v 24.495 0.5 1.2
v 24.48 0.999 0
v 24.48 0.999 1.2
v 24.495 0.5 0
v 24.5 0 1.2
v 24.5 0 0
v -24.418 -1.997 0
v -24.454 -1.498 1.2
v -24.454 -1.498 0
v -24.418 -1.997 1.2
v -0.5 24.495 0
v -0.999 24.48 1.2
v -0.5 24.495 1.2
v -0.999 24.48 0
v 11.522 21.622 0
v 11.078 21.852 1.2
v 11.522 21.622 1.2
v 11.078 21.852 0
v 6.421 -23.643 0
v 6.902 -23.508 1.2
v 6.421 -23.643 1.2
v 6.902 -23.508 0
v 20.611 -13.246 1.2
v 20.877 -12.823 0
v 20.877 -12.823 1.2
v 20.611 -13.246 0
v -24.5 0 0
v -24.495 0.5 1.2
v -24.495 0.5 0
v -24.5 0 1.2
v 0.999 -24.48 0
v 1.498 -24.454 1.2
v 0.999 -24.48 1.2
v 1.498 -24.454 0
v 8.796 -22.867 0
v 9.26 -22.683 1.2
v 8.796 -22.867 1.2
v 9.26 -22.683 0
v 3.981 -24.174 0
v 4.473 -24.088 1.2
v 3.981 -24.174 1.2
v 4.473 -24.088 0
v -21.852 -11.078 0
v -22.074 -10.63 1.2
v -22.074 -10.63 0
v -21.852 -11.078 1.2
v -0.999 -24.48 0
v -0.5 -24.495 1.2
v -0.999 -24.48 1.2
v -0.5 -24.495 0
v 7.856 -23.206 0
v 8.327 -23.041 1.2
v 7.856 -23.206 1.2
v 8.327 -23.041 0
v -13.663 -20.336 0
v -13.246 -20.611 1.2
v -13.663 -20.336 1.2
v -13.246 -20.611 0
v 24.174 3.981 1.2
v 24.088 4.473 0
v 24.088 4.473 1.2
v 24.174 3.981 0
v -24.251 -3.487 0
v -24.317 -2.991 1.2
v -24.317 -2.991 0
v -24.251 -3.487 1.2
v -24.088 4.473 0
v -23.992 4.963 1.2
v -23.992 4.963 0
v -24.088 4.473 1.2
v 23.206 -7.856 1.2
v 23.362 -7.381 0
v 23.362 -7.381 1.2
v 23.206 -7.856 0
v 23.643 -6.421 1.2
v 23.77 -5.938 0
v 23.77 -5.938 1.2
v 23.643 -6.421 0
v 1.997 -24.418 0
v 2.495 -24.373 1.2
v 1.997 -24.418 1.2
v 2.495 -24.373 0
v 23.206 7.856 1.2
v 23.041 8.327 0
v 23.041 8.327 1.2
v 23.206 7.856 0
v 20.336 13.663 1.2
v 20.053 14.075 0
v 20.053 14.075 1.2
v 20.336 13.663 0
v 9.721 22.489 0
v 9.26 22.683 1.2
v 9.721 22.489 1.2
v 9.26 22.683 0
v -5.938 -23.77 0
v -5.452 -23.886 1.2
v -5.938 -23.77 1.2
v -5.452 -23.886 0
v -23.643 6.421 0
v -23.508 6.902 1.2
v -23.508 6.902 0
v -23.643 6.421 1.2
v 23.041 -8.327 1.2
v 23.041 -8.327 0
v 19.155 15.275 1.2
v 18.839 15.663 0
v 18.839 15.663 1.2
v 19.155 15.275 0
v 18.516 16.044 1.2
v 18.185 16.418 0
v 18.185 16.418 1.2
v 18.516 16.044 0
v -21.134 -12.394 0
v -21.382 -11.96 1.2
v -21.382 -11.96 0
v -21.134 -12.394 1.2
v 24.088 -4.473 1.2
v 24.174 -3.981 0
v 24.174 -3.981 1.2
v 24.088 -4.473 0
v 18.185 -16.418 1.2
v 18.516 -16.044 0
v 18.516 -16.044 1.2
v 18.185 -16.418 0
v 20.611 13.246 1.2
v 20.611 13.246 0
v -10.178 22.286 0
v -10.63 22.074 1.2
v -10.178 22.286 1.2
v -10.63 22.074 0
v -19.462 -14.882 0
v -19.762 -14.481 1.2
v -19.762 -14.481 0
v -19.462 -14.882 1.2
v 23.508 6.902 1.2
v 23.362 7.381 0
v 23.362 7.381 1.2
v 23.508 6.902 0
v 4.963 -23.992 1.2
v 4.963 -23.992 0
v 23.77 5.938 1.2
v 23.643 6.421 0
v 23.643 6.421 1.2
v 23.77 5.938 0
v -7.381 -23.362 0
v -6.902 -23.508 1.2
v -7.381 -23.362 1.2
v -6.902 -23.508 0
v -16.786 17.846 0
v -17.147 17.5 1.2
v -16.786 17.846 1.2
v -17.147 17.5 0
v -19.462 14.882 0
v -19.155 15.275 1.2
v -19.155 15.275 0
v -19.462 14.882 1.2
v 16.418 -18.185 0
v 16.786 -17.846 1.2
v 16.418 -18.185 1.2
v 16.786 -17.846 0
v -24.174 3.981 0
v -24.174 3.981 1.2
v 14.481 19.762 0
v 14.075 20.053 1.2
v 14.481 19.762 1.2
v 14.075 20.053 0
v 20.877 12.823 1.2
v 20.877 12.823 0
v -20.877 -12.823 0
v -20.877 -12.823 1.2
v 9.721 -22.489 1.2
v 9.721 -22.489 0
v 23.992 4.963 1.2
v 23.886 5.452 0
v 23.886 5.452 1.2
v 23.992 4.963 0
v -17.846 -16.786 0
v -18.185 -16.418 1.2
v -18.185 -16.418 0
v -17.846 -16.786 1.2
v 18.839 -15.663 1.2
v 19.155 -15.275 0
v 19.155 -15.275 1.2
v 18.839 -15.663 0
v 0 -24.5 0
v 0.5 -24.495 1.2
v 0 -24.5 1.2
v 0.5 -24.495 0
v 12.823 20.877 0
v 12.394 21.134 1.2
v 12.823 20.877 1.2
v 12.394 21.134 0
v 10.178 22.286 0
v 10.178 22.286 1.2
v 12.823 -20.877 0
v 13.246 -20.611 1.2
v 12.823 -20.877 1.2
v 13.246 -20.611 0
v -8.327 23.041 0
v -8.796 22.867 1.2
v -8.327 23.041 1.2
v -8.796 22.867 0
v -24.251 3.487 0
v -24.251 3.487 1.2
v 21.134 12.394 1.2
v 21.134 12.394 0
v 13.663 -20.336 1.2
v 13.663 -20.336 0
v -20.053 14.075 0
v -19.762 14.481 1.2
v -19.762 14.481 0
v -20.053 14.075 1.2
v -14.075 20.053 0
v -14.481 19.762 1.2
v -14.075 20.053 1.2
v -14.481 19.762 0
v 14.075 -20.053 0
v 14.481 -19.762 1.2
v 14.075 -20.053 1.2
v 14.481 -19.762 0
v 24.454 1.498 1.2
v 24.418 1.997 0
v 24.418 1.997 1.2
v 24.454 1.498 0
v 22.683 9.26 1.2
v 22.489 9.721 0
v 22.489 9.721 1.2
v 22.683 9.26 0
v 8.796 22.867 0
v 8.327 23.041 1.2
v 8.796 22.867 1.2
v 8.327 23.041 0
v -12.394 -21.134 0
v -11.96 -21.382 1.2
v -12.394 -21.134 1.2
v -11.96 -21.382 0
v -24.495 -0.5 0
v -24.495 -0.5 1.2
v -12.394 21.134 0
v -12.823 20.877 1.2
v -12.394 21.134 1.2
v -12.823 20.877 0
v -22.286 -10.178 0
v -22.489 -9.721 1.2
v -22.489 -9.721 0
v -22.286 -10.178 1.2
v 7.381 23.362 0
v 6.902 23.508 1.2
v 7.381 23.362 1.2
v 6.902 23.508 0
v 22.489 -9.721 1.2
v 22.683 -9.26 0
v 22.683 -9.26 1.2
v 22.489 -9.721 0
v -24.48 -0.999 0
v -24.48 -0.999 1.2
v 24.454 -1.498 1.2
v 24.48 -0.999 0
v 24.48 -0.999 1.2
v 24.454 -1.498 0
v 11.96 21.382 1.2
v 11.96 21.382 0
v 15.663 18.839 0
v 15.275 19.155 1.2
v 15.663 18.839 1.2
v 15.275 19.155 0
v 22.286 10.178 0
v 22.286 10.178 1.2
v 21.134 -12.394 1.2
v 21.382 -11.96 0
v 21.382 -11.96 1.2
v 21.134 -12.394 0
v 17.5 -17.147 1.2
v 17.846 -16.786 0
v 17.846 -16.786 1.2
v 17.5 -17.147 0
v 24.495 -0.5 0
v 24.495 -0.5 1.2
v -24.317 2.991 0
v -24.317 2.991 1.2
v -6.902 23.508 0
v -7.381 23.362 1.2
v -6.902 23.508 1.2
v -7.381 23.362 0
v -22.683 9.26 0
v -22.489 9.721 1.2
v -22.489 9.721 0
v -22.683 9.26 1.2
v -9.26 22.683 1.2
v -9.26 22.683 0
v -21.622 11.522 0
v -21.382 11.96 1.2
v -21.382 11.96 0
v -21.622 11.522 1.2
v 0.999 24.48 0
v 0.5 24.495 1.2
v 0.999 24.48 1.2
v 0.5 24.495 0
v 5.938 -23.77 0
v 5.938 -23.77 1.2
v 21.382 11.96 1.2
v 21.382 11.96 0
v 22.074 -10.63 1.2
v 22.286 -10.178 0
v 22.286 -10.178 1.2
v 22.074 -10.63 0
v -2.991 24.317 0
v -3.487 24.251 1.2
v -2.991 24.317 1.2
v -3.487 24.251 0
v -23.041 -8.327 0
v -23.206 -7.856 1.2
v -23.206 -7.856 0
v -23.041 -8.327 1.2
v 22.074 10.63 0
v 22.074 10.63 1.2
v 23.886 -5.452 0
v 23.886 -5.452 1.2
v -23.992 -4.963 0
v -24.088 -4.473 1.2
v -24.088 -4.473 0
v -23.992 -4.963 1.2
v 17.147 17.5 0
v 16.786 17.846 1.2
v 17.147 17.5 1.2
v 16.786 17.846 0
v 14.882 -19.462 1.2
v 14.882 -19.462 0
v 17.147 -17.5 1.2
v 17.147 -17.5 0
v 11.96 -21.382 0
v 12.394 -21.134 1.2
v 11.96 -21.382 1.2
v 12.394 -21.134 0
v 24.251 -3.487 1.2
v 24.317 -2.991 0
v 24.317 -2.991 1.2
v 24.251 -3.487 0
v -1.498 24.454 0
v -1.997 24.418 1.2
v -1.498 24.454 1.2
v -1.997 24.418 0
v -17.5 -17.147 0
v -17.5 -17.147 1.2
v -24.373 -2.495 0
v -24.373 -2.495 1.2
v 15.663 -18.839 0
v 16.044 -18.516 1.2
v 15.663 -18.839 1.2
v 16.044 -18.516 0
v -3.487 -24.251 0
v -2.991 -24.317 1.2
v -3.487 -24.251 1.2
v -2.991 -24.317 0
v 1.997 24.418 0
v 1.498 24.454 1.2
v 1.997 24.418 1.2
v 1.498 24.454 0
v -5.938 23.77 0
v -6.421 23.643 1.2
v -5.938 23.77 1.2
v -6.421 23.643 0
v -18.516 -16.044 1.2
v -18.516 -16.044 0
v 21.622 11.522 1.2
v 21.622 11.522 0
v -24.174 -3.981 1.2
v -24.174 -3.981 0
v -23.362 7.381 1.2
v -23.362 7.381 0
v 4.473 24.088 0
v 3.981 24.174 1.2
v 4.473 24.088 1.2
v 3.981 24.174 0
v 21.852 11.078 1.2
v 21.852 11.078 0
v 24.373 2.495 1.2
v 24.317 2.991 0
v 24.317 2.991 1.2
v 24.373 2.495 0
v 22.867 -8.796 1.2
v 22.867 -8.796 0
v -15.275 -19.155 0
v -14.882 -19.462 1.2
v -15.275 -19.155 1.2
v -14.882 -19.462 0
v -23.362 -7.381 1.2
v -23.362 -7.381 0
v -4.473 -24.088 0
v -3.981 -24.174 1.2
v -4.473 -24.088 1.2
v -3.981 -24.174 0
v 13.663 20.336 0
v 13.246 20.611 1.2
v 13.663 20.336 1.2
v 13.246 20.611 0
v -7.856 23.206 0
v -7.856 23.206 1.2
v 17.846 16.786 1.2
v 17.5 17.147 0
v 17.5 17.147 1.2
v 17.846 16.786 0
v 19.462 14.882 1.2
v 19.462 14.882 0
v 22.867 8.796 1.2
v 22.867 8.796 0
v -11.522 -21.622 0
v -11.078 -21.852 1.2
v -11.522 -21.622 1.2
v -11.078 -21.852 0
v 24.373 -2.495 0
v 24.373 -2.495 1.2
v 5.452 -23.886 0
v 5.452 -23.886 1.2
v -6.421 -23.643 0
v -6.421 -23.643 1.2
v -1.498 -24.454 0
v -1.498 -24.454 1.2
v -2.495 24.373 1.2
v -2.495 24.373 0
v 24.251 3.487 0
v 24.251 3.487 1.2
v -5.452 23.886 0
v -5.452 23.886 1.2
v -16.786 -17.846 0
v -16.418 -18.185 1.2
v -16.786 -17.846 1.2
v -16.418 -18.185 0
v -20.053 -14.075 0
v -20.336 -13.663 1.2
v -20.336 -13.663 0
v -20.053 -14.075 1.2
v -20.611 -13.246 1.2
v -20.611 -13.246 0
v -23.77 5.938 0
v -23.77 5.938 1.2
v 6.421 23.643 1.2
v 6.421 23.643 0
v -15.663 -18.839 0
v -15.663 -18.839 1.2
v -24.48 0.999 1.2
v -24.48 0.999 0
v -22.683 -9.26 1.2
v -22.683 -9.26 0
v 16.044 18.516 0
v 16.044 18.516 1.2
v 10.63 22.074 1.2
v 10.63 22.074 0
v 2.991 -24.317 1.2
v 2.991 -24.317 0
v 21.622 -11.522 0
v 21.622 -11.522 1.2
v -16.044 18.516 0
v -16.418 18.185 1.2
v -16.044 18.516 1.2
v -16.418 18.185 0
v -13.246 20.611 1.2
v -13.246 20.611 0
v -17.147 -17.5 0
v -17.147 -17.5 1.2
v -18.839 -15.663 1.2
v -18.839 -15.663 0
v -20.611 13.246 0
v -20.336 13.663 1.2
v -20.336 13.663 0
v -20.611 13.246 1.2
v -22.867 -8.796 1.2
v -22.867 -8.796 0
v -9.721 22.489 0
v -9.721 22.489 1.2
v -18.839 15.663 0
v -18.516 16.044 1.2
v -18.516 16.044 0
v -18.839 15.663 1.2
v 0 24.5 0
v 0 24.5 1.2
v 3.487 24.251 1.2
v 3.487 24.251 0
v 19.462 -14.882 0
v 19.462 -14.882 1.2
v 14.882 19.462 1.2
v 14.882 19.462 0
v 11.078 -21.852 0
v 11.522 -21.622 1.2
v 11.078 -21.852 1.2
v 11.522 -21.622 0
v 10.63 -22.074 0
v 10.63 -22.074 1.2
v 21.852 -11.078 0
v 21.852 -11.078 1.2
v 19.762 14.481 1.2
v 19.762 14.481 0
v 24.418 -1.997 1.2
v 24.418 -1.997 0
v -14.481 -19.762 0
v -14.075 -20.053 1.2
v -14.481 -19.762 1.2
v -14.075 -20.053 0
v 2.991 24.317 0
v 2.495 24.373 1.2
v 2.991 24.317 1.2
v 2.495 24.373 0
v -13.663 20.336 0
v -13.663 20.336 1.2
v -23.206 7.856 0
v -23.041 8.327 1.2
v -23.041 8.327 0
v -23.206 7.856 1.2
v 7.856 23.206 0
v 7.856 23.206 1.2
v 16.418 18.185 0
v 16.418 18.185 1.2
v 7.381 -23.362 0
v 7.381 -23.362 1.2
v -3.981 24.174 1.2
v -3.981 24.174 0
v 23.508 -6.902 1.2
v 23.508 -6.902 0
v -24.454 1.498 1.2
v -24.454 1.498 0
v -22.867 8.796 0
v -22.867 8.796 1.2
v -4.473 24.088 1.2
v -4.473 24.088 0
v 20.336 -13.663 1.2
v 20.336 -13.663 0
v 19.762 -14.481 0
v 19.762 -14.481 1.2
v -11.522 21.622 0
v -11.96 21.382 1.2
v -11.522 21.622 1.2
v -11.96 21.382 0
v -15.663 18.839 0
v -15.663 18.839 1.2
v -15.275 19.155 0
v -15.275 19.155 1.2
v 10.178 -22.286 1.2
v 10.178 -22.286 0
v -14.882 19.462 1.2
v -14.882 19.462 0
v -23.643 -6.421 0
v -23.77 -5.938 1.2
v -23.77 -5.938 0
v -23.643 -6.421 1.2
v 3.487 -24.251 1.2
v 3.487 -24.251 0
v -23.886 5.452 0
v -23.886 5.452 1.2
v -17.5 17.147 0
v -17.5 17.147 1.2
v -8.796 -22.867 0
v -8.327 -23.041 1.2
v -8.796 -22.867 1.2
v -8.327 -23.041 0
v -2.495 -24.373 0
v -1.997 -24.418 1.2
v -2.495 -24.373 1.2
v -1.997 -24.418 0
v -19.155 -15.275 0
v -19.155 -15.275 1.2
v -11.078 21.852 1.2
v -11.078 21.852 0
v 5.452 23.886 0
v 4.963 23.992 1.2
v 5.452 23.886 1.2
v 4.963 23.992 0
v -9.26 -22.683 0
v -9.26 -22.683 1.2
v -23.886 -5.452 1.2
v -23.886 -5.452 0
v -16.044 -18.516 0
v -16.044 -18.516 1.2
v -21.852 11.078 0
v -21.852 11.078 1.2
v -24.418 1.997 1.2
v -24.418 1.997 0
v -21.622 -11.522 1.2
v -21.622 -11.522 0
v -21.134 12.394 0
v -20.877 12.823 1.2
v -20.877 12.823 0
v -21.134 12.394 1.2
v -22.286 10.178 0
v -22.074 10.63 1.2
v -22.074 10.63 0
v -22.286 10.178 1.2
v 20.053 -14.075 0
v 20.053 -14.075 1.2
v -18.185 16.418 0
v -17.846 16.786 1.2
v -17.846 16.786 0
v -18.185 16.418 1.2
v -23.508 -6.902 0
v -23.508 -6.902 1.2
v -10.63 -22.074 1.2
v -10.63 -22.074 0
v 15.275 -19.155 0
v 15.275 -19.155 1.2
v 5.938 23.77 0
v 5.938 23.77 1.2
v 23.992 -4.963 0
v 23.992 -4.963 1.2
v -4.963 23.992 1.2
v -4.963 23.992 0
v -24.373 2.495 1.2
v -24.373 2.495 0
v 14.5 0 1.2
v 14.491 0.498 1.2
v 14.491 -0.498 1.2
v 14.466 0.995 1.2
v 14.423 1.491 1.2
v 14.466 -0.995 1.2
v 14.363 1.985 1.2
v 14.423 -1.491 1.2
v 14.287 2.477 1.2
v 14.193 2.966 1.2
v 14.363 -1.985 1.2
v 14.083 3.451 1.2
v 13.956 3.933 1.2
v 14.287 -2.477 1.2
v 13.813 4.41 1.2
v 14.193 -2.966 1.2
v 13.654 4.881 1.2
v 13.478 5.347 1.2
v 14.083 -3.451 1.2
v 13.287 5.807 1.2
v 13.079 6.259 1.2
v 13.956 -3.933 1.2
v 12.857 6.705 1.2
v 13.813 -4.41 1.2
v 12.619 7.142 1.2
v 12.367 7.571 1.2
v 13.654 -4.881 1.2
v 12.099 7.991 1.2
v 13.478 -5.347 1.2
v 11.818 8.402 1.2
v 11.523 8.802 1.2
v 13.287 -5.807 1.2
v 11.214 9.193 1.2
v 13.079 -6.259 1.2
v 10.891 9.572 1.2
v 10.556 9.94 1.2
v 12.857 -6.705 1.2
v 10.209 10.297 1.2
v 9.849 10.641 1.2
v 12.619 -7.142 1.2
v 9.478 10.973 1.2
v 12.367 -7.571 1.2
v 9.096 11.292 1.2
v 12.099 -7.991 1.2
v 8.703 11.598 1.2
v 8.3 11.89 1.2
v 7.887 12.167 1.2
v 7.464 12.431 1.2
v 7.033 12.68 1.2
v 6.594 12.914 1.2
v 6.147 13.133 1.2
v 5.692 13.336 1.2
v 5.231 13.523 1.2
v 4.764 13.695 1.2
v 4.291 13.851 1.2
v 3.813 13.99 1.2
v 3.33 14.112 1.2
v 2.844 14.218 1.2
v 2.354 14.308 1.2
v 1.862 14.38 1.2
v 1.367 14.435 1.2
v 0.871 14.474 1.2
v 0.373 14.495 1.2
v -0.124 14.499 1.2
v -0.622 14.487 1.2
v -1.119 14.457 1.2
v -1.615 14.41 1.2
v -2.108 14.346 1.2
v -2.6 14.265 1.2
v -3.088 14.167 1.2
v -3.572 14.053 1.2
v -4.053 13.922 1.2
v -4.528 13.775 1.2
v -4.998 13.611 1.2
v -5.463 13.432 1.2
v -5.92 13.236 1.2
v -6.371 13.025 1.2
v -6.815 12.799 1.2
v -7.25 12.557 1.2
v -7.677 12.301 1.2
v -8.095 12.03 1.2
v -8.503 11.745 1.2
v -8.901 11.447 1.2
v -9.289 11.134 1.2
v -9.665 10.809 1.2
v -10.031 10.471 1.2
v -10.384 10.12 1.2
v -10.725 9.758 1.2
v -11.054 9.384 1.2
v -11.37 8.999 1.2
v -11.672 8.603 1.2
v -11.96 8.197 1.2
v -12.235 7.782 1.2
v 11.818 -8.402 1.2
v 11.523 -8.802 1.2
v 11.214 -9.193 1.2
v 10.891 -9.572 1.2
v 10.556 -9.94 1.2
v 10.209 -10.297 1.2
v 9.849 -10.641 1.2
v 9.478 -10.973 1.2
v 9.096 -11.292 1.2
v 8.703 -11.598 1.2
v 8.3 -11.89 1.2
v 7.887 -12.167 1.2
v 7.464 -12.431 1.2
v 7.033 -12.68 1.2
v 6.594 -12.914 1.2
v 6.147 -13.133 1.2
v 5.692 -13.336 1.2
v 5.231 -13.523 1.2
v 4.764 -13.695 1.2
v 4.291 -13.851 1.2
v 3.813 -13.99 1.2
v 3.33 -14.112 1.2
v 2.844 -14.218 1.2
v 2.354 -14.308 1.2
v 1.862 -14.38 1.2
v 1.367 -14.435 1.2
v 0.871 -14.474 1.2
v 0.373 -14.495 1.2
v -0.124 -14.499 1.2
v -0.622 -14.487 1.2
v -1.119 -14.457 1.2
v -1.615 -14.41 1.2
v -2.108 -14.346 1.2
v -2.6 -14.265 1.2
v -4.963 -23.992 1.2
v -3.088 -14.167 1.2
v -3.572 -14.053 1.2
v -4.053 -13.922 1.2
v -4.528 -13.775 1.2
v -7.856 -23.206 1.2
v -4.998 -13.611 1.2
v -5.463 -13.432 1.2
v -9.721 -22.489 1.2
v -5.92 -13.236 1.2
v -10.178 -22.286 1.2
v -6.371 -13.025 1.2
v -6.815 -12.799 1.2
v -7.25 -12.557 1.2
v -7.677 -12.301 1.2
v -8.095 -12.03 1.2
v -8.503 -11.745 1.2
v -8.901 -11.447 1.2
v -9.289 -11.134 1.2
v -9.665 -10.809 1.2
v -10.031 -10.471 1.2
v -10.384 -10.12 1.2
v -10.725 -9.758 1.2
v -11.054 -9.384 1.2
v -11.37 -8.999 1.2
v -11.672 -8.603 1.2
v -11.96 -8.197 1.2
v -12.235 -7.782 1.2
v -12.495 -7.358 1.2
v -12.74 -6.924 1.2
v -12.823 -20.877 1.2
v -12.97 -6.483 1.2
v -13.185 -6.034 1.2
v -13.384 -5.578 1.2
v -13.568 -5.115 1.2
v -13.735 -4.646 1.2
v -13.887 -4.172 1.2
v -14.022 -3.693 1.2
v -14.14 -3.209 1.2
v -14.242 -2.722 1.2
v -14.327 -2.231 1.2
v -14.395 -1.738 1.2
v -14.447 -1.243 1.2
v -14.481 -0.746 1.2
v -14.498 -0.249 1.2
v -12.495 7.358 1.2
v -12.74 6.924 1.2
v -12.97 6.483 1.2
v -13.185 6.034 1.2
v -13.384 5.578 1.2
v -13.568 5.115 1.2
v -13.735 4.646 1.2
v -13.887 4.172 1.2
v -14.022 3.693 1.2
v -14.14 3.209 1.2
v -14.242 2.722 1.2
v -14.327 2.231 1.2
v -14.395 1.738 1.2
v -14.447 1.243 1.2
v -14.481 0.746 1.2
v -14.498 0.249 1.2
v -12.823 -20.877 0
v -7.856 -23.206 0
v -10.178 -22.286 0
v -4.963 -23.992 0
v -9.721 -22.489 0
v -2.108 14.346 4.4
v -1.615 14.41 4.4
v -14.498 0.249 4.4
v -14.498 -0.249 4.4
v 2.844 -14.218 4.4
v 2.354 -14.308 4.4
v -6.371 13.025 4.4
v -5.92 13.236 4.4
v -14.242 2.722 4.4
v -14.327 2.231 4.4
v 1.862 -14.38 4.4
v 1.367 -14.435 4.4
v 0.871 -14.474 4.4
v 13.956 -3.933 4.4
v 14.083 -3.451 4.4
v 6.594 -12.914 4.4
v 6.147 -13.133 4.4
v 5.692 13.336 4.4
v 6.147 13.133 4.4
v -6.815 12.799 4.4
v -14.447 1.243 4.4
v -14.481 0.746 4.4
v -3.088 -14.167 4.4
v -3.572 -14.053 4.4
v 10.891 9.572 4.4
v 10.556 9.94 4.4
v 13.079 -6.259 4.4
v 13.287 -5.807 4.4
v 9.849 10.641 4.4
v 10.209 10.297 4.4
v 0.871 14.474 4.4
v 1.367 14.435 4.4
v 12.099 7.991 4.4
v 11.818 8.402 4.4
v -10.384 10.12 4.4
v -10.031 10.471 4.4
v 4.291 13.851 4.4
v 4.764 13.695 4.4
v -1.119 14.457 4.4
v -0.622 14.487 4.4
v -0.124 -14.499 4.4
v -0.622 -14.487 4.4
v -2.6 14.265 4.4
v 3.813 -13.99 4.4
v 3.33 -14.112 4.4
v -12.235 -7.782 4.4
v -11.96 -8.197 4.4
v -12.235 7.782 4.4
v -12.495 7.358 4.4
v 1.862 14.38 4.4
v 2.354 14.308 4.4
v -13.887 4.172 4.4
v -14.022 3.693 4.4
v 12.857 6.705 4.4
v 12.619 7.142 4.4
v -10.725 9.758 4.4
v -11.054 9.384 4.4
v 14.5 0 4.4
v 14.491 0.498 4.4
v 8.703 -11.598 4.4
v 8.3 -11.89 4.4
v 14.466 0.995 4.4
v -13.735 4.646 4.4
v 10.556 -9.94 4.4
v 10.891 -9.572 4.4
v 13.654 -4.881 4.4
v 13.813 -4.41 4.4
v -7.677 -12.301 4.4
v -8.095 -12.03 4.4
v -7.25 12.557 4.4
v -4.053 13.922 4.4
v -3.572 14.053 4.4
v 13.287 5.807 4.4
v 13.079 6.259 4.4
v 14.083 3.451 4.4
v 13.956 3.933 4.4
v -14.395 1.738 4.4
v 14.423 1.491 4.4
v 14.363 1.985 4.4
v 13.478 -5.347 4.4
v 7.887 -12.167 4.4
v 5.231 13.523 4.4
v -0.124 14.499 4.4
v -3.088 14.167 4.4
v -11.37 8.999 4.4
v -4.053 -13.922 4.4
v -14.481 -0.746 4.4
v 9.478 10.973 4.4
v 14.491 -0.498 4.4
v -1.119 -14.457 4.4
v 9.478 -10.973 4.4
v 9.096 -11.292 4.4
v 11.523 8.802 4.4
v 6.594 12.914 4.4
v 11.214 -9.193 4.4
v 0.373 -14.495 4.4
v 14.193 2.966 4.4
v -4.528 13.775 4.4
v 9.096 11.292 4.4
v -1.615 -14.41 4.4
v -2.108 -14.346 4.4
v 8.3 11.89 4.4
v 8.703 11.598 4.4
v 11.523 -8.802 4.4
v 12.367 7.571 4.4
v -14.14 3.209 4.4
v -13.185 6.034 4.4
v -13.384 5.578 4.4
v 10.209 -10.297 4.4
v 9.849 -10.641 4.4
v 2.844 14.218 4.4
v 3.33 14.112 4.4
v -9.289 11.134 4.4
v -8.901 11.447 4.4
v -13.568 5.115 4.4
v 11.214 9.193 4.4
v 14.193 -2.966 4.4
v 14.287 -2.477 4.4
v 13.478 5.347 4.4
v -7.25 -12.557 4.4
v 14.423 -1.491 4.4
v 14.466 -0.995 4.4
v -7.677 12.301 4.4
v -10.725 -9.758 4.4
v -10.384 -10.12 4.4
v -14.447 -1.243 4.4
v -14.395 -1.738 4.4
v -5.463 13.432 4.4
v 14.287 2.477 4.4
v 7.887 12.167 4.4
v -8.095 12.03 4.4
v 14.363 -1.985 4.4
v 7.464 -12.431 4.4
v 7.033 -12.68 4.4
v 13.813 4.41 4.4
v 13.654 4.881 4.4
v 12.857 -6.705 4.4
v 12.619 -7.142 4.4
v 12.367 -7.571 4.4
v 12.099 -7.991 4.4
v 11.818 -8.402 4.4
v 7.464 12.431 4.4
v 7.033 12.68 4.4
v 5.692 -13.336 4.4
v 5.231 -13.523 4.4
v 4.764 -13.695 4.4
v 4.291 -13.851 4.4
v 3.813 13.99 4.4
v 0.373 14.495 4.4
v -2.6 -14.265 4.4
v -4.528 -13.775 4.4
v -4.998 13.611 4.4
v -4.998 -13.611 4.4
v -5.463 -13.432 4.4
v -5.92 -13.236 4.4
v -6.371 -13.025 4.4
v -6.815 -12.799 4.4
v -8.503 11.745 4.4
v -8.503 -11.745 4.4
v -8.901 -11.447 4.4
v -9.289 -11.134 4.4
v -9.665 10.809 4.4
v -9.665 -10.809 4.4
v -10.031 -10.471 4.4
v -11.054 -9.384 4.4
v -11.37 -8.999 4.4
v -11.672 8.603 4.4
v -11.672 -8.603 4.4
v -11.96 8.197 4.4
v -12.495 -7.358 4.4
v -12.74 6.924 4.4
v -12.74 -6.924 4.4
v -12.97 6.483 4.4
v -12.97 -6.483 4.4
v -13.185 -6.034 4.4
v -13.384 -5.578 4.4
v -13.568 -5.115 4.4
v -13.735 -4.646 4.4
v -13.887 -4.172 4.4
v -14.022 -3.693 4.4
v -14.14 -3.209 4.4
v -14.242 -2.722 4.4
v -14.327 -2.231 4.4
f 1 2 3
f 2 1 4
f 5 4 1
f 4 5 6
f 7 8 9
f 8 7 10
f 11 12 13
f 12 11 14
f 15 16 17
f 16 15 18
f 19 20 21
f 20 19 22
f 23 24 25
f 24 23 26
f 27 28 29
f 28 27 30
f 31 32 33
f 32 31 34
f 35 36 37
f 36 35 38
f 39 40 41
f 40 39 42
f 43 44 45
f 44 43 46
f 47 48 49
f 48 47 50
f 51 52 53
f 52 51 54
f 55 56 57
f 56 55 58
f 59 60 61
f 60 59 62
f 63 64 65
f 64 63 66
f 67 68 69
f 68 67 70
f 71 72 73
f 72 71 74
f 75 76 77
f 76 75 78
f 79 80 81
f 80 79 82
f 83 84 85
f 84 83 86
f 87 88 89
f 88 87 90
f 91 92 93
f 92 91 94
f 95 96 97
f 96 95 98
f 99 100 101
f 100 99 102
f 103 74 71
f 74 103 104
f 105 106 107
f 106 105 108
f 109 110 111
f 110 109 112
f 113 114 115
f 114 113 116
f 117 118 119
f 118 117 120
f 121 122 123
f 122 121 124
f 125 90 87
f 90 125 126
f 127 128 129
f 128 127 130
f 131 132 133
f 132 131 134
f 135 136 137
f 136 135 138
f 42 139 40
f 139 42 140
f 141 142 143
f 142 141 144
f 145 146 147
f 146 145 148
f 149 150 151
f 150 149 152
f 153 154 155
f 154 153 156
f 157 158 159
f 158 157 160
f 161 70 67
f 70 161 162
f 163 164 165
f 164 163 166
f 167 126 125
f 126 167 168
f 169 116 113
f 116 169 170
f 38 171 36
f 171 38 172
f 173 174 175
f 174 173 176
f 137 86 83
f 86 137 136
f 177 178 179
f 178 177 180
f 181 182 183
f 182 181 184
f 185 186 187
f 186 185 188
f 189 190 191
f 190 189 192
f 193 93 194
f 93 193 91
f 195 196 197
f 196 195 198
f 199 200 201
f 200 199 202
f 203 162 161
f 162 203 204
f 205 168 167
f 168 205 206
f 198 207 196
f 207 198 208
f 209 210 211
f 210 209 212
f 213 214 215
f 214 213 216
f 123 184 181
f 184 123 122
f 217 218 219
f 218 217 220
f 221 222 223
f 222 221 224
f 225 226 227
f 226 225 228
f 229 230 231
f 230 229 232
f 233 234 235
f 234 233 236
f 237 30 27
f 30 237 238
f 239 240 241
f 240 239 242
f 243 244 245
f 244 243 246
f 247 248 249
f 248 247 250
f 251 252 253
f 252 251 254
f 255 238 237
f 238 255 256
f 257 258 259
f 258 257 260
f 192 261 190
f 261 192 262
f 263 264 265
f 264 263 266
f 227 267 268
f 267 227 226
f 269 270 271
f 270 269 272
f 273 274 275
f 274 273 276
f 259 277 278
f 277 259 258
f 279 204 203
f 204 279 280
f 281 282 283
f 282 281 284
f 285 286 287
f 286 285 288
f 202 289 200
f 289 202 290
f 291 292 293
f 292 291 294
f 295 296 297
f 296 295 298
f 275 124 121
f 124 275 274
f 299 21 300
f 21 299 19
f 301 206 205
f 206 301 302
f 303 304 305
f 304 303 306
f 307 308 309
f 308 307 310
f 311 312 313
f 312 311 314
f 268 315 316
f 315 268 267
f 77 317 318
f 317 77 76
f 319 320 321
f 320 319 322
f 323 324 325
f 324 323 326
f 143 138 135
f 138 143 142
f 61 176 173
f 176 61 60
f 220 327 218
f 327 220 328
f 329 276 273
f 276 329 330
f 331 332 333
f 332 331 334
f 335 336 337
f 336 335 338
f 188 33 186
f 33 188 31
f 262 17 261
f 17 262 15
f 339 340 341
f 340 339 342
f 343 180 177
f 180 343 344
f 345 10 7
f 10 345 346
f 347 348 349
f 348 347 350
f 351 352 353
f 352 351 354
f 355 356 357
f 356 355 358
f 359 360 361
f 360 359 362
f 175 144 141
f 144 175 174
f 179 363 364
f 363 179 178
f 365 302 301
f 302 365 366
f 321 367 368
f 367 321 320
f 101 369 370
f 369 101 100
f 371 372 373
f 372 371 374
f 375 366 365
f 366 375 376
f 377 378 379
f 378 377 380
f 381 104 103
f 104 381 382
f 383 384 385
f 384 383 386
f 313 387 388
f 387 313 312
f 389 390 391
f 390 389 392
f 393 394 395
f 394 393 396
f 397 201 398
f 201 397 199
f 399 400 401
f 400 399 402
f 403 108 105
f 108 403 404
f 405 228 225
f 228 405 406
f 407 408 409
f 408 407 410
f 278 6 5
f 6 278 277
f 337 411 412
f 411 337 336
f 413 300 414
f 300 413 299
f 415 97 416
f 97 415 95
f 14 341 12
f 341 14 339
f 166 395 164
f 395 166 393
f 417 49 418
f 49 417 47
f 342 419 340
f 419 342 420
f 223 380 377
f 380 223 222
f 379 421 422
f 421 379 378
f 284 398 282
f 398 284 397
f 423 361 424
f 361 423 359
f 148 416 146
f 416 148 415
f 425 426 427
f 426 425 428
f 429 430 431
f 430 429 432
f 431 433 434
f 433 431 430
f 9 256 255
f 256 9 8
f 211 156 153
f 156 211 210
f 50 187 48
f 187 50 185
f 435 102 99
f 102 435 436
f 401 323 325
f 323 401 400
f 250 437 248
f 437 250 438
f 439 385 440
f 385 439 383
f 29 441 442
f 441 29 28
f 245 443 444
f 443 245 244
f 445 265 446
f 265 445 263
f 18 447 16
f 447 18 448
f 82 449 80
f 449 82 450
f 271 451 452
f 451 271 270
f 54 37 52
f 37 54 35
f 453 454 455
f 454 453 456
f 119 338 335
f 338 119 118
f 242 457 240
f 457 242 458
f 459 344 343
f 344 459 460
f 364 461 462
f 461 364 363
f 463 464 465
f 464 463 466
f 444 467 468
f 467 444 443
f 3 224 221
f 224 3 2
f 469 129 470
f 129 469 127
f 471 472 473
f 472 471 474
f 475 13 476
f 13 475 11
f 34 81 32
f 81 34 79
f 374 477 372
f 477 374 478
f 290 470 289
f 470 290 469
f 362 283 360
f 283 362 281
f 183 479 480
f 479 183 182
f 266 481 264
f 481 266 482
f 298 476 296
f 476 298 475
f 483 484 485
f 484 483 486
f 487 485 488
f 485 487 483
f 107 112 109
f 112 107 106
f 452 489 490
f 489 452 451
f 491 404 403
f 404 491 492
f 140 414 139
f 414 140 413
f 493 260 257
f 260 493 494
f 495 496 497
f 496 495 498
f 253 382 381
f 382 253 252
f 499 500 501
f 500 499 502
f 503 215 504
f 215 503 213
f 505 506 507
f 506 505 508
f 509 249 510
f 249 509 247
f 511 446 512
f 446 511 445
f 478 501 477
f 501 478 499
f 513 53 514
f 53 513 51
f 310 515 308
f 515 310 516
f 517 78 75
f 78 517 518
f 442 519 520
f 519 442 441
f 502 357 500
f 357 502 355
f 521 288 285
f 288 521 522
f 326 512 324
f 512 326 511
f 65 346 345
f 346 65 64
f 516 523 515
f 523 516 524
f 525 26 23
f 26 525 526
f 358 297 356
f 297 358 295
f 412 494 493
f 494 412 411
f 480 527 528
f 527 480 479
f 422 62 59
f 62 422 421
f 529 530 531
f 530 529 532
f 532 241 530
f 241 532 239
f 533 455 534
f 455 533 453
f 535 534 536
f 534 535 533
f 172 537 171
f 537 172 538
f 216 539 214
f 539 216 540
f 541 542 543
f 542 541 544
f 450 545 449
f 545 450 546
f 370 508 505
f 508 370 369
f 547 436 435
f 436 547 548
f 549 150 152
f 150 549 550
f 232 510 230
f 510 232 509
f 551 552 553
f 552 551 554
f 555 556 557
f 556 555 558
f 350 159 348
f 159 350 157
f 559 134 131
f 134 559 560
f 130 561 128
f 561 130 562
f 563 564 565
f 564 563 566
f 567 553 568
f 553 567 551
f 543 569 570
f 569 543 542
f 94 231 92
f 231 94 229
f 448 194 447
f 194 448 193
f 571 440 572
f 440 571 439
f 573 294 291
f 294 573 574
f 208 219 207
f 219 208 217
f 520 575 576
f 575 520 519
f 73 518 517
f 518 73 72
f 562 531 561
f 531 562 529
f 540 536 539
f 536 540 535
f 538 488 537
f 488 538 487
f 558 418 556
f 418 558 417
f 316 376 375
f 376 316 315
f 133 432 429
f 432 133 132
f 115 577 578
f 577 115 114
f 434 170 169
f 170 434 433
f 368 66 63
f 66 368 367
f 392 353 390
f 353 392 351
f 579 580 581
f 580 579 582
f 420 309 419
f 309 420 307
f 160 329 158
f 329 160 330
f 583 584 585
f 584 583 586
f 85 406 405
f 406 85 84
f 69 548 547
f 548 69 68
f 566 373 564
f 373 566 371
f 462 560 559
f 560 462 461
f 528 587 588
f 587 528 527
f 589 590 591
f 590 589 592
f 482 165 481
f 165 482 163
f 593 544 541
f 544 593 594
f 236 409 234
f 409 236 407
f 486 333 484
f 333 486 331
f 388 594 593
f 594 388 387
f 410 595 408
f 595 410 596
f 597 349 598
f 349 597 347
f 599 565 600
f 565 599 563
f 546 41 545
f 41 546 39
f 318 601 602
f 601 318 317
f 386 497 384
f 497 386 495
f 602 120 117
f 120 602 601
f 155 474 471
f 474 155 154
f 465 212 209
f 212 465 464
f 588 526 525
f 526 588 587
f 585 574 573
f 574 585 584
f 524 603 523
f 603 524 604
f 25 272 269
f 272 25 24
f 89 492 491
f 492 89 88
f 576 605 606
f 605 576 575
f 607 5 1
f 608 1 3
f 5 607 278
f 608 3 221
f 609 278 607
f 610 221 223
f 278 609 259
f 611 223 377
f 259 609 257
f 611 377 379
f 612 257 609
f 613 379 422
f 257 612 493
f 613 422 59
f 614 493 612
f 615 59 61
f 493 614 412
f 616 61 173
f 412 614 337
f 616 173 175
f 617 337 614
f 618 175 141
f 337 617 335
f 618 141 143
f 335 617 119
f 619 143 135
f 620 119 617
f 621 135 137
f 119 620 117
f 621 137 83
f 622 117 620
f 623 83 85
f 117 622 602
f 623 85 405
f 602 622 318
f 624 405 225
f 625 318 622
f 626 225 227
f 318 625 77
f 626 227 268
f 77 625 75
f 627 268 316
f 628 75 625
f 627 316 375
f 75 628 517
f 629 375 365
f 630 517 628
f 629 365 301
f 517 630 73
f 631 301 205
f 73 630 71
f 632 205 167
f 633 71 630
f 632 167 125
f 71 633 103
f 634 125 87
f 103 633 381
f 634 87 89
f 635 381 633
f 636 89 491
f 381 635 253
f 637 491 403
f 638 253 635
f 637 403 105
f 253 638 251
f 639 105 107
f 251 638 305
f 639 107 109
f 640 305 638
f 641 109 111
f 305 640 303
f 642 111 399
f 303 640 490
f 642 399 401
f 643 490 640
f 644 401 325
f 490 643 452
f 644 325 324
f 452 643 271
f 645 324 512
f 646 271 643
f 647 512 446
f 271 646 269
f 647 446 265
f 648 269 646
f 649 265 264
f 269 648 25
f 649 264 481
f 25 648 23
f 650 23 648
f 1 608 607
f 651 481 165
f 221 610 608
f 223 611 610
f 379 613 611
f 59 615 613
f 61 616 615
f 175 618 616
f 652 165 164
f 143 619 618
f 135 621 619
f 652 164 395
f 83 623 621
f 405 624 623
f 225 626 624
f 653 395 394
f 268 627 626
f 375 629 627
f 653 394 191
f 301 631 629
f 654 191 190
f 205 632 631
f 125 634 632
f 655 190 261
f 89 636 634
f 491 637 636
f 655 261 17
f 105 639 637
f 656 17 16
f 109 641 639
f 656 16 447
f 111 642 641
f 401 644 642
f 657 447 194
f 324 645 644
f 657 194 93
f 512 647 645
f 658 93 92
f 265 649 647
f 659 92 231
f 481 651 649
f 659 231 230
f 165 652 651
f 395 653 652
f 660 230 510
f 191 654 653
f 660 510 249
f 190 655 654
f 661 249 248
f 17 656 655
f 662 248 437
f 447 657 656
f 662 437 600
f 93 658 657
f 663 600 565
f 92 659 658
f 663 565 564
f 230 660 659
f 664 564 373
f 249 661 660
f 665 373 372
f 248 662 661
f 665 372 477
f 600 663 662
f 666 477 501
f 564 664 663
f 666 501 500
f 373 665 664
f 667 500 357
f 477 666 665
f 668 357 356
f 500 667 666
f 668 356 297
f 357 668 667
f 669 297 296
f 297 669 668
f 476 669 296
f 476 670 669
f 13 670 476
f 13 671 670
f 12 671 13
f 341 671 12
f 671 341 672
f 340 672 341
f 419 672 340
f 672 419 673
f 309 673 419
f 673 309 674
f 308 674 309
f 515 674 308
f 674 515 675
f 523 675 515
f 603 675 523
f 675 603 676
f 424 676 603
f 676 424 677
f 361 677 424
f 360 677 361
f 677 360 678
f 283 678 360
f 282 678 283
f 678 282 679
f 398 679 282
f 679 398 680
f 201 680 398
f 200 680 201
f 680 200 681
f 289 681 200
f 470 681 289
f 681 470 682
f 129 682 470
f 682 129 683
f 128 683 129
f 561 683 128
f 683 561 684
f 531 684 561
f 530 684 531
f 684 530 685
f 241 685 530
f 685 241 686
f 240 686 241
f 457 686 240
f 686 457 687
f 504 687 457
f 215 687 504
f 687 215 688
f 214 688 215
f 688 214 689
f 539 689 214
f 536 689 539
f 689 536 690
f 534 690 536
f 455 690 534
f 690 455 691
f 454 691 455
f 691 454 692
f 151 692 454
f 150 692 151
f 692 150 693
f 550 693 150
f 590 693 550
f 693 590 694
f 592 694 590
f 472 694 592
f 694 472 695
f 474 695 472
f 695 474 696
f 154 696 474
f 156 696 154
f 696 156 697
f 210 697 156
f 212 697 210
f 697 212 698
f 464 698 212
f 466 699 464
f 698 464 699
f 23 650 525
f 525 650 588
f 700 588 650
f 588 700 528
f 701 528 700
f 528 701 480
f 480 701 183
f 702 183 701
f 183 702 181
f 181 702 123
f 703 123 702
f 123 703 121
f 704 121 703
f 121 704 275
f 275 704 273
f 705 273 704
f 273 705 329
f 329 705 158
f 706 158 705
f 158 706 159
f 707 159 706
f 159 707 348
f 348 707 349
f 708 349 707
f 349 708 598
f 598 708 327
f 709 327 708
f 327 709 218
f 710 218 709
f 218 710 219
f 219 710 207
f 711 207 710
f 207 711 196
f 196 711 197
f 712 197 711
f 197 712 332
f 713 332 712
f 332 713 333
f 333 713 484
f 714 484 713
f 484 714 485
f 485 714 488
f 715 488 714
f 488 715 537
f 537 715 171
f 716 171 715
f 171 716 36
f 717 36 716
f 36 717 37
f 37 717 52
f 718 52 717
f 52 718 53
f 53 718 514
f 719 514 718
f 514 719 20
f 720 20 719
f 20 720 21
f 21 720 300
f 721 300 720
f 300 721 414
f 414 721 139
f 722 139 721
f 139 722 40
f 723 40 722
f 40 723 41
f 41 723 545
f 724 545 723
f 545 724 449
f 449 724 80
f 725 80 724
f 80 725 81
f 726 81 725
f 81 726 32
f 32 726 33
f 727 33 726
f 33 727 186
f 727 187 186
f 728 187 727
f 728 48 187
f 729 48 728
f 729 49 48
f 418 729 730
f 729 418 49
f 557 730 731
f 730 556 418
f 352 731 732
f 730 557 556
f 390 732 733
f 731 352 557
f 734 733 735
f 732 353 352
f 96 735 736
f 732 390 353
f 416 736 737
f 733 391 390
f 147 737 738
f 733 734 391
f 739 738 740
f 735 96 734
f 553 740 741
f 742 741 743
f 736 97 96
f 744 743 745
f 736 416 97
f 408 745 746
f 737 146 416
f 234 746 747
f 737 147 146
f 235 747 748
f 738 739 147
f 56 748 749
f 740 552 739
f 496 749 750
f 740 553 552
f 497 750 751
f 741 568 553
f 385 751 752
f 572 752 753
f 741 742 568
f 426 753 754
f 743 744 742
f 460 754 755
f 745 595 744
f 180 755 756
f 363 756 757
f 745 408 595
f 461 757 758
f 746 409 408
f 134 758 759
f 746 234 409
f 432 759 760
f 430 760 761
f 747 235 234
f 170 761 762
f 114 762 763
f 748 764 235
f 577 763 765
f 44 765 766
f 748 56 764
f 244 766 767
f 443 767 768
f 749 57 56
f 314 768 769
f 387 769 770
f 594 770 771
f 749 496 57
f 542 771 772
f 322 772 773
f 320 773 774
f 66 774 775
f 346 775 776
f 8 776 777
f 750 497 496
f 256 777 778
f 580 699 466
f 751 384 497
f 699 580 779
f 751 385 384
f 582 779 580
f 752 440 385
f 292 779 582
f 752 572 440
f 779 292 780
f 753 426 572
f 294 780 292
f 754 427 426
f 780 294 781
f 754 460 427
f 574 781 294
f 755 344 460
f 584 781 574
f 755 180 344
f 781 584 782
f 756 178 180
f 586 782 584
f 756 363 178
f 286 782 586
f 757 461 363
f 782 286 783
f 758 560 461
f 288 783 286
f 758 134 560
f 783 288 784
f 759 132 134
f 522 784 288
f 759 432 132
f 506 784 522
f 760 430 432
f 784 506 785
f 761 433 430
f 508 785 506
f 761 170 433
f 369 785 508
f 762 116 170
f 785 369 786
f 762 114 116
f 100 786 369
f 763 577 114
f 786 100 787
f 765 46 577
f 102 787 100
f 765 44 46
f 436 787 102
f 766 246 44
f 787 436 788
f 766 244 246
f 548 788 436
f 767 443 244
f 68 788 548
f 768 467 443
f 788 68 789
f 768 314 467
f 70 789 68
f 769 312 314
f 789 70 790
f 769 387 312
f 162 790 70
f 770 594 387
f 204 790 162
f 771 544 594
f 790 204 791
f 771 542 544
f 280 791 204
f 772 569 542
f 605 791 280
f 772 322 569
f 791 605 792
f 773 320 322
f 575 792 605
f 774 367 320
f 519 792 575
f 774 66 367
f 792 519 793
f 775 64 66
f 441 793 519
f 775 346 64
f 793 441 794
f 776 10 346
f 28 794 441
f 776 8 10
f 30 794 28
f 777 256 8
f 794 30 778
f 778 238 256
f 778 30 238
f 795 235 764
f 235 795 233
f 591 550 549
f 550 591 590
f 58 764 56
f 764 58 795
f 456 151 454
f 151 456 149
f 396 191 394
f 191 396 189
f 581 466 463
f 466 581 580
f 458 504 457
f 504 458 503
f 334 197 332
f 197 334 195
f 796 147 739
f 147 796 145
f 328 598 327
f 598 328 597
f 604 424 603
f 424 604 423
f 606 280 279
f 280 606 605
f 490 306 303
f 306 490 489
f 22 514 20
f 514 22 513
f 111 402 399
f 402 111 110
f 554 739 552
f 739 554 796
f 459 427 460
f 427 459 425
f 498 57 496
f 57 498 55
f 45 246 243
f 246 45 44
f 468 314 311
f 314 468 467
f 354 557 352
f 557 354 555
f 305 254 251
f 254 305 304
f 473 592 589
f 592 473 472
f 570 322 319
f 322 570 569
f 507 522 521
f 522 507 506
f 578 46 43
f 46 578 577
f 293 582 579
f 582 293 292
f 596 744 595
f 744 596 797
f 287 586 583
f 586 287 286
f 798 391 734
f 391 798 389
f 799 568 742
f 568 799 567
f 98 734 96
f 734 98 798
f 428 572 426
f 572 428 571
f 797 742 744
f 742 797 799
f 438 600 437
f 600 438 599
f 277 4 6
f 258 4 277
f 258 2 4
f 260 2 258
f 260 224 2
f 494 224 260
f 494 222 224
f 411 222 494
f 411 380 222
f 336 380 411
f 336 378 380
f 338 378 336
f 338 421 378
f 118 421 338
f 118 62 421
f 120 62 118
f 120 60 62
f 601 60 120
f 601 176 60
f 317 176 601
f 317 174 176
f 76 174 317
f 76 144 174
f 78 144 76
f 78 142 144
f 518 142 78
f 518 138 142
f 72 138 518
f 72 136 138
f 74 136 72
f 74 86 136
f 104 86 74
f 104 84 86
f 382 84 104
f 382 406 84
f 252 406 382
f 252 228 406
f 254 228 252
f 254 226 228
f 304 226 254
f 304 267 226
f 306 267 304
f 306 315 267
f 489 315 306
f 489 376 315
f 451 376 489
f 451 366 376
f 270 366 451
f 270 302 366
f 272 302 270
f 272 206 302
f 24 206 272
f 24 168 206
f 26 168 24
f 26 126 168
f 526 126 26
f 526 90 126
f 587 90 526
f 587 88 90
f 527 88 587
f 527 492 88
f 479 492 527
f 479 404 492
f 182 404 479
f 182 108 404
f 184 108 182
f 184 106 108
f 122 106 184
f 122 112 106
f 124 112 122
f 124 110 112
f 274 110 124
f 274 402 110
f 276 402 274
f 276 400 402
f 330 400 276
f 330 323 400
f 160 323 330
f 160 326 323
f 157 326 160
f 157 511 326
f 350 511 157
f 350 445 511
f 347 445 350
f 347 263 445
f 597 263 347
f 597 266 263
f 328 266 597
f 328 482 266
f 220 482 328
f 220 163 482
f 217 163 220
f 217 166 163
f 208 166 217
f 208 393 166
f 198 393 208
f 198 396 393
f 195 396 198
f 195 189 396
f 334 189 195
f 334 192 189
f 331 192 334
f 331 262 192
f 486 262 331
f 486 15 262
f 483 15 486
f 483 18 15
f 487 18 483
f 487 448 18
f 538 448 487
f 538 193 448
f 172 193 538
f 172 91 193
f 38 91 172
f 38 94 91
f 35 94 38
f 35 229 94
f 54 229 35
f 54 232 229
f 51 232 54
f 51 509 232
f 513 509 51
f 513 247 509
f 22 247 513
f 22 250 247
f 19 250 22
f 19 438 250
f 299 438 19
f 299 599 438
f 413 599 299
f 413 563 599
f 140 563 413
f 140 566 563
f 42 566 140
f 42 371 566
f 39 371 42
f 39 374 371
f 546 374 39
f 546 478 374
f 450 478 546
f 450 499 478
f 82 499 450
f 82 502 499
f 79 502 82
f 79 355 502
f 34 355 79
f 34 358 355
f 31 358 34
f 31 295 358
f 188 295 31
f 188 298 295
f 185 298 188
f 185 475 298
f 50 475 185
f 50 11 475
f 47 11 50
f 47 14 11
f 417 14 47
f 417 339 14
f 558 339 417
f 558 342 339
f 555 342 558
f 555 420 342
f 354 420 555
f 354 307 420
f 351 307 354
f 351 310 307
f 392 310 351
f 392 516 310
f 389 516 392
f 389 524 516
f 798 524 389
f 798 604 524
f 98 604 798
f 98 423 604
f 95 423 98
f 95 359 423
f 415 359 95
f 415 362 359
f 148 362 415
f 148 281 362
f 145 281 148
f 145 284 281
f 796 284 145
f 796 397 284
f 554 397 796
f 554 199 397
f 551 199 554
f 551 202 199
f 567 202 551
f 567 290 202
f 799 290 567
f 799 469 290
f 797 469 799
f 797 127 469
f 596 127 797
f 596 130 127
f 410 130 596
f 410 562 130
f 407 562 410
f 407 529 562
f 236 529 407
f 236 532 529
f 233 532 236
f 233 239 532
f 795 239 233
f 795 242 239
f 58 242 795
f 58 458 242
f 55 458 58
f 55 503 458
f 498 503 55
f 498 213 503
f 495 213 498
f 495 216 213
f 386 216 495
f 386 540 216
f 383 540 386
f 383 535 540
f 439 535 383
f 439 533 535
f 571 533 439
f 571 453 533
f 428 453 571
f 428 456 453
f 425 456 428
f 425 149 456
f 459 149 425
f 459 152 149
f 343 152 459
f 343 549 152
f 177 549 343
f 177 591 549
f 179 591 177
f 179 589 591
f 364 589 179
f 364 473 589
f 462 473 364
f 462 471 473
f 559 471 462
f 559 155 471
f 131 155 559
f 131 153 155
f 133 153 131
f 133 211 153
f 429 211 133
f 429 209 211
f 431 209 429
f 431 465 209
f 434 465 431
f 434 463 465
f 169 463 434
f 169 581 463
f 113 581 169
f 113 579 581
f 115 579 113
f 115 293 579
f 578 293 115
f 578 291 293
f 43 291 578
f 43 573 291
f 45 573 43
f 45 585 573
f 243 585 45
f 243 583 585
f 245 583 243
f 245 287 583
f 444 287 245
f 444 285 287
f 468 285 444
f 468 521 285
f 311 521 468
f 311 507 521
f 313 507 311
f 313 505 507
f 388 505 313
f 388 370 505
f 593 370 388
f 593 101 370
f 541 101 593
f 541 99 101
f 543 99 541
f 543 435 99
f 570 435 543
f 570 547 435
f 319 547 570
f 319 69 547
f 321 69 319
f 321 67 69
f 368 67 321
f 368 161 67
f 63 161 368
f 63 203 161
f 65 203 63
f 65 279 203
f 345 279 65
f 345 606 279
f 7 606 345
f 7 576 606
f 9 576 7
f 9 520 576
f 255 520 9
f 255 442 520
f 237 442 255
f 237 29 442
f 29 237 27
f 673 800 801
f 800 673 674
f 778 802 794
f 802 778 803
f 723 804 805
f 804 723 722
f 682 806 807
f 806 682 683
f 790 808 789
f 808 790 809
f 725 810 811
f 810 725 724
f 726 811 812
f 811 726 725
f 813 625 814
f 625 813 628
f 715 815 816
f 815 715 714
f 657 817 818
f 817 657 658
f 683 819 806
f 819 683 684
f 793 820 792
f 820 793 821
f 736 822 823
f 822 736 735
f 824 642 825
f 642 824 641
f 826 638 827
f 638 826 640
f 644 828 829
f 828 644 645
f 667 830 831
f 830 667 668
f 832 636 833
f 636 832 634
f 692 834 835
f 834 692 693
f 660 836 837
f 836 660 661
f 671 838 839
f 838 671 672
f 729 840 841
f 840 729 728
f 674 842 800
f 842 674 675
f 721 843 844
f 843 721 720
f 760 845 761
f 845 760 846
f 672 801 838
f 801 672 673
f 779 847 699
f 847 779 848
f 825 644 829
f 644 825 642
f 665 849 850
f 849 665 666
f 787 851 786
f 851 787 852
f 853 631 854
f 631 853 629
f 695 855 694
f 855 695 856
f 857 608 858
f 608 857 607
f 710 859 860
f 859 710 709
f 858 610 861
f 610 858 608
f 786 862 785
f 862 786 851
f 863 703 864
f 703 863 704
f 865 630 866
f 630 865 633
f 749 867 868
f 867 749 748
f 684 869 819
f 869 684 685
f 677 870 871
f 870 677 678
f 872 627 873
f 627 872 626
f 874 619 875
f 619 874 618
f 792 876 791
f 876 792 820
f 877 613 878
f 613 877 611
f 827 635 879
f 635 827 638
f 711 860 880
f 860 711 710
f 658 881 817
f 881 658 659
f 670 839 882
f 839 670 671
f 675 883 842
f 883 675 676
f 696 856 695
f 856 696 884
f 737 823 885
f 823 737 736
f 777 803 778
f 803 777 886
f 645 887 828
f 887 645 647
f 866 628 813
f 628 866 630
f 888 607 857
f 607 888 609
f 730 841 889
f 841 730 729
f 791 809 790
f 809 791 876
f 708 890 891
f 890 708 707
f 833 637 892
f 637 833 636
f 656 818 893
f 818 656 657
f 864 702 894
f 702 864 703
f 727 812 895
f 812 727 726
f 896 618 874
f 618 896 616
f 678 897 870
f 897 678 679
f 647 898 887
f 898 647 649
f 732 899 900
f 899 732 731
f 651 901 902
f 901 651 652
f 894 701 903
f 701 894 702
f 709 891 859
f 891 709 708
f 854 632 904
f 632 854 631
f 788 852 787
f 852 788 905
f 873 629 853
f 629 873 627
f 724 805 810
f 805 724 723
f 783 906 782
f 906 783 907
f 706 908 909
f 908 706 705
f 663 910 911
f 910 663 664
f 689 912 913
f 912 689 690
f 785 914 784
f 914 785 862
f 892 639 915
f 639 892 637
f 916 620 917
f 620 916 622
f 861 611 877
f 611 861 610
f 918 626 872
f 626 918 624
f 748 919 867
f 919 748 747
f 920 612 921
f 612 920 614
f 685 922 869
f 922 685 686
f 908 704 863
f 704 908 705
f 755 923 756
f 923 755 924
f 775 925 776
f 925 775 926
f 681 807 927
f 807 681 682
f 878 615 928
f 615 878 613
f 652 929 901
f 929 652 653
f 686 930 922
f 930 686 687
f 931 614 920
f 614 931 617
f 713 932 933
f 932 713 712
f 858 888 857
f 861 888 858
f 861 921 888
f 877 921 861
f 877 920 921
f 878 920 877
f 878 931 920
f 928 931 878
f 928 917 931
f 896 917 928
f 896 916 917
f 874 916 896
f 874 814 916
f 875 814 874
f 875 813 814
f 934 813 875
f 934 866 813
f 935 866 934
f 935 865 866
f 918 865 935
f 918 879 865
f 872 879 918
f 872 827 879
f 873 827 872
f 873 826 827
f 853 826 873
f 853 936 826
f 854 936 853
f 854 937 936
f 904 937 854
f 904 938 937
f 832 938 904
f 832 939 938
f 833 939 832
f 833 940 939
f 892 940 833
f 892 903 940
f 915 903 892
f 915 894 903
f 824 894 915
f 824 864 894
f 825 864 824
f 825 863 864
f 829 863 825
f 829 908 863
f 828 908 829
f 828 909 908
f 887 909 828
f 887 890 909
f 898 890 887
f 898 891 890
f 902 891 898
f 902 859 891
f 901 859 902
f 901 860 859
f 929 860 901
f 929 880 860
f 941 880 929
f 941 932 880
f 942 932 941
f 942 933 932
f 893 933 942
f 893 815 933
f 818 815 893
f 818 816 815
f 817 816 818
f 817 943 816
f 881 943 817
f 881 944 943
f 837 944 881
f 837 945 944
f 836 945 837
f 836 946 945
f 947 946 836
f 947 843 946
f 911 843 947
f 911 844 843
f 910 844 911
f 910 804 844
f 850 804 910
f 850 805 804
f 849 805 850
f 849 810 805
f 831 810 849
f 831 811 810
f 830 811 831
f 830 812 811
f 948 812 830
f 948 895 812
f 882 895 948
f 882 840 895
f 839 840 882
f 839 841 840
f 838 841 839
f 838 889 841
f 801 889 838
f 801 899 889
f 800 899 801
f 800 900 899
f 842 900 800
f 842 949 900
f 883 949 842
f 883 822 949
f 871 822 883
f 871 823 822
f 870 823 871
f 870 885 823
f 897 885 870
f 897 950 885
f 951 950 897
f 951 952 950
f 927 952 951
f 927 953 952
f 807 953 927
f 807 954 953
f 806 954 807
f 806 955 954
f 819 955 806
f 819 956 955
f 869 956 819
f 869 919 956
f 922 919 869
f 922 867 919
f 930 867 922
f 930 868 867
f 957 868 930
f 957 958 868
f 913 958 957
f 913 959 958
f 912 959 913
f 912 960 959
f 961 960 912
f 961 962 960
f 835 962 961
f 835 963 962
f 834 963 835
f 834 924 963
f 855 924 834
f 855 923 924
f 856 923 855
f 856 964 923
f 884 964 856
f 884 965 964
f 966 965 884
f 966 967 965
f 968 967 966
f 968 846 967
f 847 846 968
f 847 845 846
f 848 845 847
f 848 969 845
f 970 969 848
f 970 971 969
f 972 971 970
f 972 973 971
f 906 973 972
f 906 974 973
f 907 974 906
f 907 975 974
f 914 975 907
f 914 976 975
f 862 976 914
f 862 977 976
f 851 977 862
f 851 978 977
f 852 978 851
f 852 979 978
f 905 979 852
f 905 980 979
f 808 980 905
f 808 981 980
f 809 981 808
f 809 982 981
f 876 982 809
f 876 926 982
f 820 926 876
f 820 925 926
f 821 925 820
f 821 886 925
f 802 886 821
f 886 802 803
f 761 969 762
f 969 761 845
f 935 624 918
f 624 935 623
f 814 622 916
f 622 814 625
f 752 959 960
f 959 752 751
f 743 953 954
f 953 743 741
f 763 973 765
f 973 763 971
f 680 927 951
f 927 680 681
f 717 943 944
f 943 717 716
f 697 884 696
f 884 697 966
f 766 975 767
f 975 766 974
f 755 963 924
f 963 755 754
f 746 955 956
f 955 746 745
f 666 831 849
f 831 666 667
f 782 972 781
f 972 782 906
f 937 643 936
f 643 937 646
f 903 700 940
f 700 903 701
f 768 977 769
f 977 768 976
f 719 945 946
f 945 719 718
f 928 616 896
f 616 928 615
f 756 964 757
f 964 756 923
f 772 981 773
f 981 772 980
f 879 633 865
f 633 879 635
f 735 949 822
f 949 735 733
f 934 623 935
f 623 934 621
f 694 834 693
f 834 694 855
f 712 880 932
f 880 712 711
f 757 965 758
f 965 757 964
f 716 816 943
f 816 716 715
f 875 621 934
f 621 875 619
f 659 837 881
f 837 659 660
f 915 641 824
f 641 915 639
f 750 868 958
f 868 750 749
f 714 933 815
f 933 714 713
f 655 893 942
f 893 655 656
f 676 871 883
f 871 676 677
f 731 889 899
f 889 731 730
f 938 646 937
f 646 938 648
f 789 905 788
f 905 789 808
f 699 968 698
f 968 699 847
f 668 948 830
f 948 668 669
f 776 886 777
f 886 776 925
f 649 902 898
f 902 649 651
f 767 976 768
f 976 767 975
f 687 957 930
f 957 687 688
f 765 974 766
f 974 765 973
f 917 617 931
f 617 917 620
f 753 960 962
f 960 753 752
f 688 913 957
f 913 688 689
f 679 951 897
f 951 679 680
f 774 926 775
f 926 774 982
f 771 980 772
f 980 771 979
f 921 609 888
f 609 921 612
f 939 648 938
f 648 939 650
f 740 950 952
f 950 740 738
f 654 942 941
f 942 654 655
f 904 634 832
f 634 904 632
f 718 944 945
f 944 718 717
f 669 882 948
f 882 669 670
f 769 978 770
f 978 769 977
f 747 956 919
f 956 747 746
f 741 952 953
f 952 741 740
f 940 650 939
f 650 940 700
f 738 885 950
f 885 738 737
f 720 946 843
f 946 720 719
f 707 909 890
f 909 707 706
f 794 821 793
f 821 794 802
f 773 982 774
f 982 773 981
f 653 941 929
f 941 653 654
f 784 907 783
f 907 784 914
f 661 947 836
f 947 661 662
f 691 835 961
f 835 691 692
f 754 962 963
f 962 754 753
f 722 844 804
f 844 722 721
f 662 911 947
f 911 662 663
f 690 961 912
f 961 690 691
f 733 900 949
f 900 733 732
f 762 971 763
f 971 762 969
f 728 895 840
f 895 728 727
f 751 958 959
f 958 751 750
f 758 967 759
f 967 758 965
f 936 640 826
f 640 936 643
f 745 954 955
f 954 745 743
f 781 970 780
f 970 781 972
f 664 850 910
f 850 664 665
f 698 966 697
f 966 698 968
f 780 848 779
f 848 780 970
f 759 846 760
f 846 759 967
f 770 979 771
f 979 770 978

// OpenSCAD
module plug(plug_diameter,base_rim,plug_thickness,base_thickness) {
    union() {
        cylinder(h=base_thickness, r=base_rim+plug_diameter/2);
        translate([0,0,base_thickness]) cylinder(h=plug_thickness, d=plug_diameter);
    }
}
$fa=1;
$fs=0.5;;
plug(29,10,3.2,1.2);
